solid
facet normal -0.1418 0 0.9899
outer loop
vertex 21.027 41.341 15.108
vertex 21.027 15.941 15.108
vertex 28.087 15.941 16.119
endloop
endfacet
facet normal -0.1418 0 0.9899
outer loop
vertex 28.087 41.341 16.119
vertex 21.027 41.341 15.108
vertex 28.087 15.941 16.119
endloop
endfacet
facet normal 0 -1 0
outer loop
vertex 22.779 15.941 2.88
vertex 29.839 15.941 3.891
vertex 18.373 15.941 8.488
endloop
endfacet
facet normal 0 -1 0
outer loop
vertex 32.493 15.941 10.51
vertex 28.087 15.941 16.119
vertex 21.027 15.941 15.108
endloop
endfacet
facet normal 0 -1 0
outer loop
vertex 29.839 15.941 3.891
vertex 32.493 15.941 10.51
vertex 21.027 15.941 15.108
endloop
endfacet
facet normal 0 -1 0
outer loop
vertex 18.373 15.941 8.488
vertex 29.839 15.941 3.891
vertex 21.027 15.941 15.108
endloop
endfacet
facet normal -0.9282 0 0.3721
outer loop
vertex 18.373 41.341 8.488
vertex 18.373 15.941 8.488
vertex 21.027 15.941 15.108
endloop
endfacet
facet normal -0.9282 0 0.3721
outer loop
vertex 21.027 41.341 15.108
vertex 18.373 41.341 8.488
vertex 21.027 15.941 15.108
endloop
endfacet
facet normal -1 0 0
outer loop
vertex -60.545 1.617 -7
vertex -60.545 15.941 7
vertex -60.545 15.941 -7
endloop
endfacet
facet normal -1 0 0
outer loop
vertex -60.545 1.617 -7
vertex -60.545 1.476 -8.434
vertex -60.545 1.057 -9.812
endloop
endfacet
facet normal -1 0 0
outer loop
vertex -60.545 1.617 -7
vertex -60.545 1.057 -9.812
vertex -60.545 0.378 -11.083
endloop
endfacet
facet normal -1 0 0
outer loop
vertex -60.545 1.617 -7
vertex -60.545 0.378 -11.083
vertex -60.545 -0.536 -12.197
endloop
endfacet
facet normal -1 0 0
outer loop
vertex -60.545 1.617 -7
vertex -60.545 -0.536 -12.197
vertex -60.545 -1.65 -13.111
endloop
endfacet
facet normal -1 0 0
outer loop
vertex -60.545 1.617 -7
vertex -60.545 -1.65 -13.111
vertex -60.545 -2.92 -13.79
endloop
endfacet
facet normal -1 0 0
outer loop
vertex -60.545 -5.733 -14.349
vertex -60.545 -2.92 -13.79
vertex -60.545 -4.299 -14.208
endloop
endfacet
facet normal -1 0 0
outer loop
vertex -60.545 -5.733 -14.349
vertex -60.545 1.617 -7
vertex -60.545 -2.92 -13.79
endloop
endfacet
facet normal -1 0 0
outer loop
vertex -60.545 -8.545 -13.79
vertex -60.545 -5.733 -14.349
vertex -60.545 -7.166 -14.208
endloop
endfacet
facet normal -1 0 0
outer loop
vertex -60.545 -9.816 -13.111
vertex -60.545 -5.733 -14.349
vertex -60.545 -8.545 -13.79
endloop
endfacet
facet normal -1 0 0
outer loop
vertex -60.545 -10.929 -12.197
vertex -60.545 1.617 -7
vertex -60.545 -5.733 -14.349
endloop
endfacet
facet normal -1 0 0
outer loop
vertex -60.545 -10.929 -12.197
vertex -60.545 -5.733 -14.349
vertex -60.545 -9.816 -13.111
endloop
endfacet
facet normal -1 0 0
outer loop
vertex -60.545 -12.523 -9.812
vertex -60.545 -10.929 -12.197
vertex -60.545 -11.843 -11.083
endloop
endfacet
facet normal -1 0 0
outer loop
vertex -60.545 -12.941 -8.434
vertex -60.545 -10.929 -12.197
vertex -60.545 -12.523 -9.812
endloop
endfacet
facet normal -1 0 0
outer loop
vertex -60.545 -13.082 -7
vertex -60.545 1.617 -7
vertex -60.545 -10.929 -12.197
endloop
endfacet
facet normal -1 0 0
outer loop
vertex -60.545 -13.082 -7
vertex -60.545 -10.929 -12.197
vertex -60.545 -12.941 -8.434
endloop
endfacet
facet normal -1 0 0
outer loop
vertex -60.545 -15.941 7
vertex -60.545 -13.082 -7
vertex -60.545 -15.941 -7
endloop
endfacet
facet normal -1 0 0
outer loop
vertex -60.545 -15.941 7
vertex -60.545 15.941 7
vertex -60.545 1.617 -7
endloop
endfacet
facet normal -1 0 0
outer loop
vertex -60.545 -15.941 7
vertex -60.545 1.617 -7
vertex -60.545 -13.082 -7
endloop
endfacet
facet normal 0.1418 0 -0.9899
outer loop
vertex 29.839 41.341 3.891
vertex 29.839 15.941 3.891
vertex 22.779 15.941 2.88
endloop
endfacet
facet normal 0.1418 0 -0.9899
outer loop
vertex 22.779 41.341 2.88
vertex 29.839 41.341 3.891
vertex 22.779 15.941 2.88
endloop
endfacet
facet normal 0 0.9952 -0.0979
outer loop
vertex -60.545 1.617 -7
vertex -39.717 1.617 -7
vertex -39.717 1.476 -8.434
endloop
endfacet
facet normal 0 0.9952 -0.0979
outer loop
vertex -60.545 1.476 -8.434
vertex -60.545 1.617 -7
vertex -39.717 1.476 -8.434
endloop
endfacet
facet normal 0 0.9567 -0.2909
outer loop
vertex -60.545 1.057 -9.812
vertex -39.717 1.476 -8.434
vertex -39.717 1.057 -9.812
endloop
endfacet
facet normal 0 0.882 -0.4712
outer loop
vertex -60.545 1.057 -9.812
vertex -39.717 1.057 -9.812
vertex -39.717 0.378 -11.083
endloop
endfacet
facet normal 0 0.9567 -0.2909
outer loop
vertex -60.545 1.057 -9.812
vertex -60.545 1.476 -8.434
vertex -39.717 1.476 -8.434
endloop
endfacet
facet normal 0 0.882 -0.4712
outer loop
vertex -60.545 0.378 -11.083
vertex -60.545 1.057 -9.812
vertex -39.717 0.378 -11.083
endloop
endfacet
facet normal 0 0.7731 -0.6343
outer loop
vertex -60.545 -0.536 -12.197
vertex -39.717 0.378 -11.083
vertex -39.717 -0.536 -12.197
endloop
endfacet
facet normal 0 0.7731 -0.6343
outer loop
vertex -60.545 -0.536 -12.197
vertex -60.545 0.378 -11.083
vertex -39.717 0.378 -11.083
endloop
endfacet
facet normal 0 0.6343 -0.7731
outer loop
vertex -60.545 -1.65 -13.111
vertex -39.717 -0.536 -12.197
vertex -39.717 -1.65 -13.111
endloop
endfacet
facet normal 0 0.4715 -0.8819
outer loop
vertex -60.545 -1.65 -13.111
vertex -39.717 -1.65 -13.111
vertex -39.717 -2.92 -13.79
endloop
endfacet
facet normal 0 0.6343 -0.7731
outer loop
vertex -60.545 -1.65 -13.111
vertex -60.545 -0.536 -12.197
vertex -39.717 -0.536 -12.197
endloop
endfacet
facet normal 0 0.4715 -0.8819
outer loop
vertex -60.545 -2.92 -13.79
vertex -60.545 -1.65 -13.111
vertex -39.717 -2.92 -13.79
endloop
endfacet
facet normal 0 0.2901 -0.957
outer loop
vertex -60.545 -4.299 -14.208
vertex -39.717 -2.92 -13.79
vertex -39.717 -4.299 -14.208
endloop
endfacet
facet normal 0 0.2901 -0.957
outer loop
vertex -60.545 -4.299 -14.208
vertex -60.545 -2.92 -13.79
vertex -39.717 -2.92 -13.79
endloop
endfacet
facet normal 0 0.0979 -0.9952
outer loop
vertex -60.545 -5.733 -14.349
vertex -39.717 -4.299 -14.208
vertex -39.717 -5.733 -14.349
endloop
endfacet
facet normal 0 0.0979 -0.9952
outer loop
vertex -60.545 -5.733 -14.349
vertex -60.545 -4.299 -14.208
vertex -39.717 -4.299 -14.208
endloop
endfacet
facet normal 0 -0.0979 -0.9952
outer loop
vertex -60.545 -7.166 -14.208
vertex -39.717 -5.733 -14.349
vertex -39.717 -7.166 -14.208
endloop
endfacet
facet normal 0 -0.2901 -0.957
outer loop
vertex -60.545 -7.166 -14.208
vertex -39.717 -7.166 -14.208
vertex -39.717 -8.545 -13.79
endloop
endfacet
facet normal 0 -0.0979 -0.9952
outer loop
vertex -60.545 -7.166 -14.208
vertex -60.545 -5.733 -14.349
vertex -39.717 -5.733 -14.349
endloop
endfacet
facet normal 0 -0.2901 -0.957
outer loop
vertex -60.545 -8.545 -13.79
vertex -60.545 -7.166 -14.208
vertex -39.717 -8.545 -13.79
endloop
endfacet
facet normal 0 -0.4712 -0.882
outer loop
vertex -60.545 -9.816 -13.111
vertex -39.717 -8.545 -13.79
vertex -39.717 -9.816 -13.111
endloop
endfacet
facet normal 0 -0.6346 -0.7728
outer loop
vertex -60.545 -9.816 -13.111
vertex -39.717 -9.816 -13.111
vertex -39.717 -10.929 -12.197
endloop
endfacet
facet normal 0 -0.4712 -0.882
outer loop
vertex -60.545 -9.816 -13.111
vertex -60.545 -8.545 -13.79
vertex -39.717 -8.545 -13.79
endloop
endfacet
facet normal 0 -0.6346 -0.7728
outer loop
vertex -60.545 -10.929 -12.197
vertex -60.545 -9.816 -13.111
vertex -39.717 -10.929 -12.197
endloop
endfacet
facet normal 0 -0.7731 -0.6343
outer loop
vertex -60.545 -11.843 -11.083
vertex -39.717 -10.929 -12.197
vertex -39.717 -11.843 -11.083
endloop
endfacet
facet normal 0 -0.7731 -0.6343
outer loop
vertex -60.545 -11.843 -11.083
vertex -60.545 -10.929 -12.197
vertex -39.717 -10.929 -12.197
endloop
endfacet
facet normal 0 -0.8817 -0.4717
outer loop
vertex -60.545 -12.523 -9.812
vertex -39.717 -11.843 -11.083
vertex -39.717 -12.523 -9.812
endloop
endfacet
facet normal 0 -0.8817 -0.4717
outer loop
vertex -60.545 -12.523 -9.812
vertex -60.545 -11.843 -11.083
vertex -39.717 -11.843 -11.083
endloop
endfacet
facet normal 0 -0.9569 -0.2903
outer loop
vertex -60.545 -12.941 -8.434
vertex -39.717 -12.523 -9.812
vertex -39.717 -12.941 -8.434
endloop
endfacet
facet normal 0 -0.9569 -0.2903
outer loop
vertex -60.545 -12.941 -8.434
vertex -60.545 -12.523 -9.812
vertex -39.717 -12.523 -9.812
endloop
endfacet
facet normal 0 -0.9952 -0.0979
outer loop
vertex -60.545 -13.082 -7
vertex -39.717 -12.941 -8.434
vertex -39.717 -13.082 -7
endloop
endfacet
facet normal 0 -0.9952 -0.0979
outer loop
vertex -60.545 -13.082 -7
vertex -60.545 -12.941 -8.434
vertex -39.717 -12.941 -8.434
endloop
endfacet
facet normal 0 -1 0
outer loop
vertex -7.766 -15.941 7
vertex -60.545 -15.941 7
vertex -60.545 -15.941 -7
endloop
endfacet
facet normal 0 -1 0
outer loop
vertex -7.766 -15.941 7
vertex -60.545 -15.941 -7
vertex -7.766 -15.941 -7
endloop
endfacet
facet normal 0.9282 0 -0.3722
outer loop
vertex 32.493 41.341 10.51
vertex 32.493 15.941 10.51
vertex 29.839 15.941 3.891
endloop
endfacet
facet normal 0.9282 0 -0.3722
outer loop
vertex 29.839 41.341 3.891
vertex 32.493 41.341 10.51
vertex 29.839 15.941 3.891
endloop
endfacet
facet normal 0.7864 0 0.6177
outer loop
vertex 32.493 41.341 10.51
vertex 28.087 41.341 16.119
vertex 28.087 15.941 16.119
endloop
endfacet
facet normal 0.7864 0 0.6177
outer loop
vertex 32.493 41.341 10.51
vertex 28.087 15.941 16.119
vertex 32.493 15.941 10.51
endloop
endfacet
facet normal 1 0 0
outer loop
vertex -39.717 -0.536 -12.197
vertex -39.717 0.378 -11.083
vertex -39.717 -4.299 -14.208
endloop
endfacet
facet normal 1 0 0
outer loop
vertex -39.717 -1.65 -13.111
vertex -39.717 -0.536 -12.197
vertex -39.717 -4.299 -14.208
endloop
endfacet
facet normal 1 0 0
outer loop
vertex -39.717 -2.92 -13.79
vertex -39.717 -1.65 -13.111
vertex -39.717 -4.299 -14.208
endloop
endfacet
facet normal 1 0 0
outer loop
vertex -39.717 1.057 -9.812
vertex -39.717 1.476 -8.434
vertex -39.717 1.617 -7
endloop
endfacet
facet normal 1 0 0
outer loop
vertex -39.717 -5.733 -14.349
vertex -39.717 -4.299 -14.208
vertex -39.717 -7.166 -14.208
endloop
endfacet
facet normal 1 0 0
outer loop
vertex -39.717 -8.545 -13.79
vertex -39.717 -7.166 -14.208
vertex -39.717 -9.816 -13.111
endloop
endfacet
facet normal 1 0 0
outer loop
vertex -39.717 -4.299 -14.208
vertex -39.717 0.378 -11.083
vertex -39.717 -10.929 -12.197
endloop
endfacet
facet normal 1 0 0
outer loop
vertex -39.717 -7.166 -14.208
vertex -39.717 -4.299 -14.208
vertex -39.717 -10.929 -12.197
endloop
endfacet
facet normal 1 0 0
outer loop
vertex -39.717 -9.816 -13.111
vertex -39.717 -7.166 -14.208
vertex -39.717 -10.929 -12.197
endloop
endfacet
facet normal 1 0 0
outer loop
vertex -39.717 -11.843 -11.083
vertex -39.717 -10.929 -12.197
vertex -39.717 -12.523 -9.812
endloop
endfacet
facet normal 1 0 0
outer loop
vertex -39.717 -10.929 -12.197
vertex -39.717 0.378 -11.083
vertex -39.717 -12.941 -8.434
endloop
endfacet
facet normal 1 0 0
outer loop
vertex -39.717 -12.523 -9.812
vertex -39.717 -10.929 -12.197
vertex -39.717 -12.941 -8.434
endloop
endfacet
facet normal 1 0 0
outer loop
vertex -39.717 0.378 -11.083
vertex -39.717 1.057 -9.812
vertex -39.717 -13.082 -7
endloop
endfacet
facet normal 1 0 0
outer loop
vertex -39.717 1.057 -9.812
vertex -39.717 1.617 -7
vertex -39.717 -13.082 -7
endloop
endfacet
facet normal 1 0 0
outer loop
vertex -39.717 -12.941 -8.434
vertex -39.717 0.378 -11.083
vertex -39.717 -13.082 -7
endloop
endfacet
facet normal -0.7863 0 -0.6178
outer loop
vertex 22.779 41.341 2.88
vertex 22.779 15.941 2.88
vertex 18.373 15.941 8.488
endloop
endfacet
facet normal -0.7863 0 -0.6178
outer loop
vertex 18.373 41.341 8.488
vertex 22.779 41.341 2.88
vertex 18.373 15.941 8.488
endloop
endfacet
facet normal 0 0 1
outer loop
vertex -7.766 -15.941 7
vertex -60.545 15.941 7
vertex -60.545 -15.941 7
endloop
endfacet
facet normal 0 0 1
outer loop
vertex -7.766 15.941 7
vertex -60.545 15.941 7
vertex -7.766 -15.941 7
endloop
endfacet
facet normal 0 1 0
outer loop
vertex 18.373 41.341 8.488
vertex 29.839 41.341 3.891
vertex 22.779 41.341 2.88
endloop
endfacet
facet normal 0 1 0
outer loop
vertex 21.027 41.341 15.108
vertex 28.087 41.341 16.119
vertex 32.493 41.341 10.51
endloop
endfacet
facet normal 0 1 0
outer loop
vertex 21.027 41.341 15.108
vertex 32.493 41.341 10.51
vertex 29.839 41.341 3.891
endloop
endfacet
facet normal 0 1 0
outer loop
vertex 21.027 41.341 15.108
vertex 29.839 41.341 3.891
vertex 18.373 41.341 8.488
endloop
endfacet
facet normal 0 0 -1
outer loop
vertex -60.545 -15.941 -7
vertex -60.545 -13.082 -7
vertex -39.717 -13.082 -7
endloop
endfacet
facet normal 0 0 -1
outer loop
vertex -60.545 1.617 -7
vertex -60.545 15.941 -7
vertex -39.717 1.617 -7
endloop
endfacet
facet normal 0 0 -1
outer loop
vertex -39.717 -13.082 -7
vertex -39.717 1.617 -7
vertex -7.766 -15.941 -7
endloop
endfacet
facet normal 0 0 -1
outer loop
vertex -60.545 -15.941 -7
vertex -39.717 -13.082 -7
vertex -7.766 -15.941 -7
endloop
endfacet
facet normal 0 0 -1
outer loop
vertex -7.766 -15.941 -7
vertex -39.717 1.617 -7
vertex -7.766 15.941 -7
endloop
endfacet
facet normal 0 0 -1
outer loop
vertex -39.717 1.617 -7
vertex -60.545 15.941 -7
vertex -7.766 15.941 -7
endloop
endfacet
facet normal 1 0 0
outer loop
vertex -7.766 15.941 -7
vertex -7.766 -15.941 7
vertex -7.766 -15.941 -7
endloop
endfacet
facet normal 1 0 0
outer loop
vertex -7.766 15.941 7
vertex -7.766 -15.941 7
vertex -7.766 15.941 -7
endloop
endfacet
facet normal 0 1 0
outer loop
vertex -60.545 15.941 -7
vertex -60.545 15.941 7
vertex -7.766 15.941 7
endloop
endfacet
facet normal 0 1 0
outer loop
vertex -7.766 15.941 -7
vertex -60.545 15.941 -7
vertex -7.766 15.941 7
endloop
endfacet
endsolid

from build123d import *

# Parameters (mm, degrees)
F0_W      = 42.3654569313
F0_H      = 31.8825021386
F1_DEPTH  = 7
F1_FACE_W = 31.8825021386
F1_FACE_H = 14
F3_DEPTH  = 10.414
F5_DEPTH  = 25.4


with BuildPart() as f1:
    # F0 (on Top) → F1 (new body, symmetric)
    with BuildSketch(Plane.XY):
        with Locations((-28.9487093687, 0)):
            Rectangle(F0_W, F0_H)
    extrude(amount=F1_DEPTH, both=True)

    # F2 (on face) + F1_face (on face) → F3 (join, symmetric)
    with BuildSketch(Plane(origin=(-50.1314378344, 0, 0), x_dir=(0, -1, 0), z_dir=(-1, 0, 0))):
        with BuildLine():
            Line((-1.6167561431, -7), (13.0820755754, -7))
            ThreePointArc((13.0820755754, -7), (5.7326597162, 0.3494158592), (-1.6167561431, -7))
        make_face()
        with BuildLine():
            ThreePointArc((-1.6167561431, -7), (5.7326597162, -14.3494158592), (13.0820755754, -7))
            Line((13.0820755754, -7), (-1.6167561431, -7))
        make_face()
    with BuildSketch(Plane(origin=(-50.1314378344, 0, 0), x_dir=(0, -1, 0), z_dir=(-1, 0, 0))):
        Rectangle(F1_FACE_W, F1_FACE_H)
    extrude(amount=F3_DEPTH, both=True)


with BuildPart() as f5:
    # F4 (on face) → F5 (new body)
    with BuildSketch(Plane(origin=(0, 15.9412510693, 0), x_dir=(-1, 0, 0), z_dir=(0, 1, 0))):
        Polygon((-21.0274129238, 15.1079419327), (-28.0873961747, 16.1190163344), (-32.4930039171, 10.5104286897), (-29.8386284087, 3.8907666433), (-22.7786451578, 2.8796922415), (-18.3730374153, 8.4882798862), align=None)
    extrude(amount=F5_DEPTH)


solid = Compound([f1.part, f5.part])
